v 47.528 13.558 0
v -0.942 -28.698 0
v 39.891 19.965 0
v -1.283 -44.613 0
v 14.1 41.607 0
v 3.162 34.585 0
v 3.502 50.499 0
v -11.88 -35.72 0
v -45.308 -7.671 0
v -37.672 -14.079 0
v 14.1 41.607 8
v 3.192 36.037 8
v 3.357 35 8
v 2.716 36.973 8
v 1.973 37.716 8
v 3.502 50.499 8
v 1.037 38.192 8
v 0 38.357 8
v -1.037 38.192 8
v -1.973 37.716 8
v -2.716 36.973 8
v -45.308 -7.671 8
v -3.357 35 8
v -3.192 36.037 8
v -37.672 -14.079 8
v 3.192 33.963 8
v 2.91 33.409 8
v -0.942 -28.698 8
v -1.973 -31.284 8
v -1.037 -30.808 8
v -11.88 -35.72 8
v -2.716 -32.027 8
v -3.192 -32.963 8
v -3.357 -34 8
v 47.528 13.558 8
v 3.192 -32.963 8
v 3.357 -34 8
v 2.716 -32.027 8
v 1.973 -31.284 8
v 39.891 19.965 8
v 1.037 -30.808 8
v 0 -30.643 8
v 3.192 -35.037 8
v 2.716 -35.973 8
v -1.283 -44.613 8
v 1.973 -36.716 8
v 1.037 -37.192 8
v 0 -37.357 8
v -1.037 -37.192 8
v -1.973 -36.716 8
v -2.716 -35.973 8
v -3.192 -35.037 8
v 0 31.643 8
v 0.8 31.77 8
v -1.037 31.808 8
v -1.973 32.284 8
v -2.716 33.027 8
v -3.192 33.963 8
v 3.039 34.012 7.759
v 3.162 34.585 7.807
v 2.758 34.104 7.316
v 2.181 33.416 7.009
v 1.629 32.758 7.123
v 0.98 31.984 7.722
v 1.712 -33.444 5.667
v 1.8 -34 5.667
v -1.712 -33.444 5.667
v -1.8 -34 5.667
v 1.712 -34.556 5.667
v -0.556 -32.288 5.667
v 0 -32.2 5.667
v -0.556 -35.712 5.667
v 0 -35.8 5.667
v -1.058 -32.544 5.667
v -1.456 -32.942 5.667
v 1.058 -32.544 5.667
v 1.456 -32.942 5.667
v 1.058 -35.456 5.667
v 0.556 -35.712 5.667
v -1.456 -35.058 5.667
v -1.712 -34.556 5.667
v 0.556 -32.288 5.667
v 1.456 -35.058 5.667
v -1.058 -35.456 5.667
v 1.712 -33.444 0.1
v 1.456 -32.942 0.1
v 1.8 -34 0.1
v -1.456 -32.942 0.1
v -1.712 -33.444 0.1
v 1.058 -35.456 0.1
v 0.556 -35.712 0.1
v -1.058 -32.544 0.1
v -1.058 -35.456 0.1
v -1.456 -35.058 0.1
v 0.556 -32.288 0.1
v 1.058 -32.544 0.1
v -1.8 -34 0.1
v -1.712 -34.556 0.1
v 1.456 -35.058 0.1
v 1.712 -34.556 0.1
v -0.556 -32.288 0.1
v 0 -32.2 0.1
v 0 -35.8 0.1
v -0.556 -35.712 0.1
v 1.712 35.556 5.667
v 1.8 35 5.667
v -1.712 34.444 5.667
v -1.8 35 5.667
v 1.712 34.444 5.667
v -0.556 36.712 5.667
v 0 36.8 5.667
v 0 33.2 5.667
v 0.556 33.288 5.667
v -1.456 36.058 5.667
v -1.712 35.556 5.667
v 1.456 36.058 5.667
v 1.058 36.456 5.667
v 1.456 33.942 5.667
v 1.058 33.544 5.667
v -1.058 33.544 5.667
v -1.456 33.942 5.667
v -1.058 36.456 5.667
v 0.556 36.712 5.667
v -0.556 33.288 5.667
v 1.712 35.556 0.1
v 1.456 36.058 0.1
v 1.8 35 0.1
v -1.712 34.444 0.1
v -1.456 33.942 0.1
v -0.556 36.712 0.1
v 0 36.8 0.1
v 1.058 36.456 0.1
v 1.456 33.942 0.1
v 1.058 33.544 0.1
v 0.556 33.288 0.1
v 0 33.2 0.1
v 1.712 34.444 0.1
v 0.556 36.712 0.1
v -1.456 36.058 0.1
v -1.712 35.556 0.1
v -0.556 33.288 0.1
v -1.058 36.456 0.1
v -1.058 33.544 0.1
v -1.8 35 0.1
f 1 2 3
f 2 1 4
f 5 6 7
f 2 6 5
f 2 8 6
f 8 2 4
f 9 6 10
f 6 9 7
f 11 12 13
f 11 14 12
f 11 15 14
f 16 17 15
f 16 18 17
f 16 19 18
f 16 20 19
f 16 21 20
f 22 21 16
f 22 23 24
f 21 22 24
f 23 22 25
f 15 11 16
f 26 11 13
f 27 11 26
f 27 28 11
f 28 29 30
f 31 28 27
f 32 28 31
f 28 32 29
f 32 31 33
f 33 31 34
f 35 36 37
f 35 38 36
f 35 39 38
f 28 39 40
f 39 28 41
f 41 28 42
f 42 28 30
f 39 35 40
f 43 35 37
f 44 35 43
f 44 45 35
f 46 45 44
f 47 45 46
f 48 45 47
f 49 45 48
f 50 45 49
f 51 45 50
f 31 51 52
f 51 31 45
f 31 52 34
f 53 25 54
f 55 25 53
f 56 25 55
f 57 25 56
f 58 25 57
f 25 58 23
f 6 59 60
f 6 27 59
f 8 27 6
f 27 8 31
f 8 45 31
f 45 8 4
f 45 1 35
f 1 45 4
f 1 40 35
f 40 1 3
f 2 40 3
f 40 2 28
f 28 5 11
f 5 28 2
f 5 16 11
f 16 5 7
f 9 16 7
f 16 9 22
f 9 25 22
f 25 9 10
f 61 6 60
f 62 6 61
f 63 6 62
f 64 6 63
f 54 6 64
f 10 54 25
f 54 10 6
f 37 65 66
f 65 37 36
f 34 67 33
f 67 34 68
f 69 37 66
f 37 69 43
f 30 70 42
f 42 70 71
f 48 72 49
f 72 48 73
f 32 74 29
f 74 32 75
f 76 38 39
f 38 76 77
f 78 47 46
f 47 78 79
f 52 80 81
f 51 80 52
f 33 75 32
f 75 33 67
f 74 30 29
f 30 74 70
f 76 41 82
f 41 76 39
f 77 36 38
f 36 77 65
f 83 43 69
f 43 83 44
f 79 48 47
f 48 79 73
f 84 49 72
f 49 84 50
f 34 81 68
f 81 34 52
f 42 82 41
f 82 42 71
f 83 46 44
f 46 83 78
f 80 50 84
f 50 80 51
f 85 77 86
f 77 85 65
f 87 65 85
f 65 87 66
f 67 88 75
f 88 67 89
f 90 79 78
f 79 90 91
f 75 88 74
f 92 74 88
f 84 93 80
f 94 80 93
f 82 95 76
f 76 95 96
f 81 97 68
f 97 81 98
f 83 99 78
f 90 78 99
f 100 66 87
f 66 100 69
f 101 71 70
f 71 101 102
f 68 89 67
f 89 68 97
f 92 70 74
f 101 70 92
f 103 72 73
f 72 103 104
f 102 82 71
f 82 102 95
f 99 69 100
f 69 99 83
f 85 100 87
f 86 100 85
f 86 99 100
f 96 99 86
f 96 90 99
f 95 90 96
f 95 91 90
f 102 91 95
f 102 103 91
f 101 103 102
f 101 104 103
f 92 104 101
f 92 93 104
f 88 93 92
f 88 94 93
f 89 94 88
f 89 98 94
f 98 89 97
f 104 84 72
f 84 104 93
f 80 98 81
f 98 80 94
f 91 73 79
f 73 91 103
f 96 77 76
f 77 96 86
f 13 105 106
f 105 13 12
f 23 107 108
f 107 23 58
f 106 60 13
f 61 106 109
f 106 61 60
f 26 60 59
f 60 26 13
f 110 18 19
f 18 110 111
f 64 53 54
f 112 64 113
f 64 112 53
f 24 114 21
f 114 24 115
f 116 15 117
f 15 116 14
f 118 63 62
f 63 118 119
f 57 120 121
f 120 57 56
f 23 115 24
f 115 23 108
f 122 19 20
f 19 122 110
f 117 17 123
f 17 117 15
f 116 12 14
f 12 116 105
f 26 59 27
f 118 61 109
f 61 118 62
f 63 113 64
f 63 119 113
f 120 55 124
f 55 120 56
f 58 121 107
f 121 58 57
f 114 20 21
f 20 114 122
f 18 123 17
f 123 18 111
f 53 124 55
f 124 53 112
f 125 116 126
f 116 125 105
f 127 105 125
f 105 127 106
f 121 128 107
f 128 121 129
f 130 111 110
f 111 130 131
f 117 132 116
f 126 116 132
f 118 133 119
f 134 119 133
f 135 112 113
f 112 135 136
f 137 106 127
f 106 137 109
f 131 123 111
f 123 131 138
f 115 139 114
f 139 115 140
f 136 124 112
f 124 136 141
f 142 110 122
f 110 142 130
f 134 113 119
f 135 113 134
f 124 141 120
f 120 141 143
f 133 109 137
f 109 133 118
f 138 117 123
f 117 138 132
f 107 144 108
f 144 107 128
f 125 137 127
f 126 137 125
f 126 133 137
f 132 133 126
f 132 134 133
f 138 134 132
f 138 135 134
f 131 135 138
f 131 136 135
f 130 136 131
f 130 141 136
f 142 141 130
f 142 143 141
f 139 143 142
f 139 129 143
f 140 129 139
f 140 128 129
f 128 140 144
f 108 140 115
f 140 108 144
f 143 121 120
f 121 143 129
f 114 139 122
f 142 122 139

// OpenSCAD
// Street Numbers for 3D printing
// Charles Tilford, 2019
// License: CC BY-NC-SA 4.0
//   https://creativecommons.org/licenses/by-nc-sa/4.0/

char="N";     // The number/letter to print

// Units are in mm, except for height of letter

// How many inches high should letter be?
inchesHigh=3;
// How thick/deep should letter be (mm)?
depth=8;

// Character coordinates just center the letter
charX=-40;    // Character X coord
charY=-35;    // Character Y coord
topScrew=35;  // Top screw Y coord
botScrew=-34; // Bottom screw Y coord
height=8;     // Thickness of character
// Screw dimensions. Default presumes
// #6 sheet metal screw
screwWid=3.6; // Width of screw shaft
screwTop=6.78;// Width of screw head
screwCon=5.08;// Height of head 'cone'

// Font to print in. Your system needs this
// installed, of course. If changed the hole
// positions almost certainly need to be
// changed, and maybe charX/charY.
fName="Open Sans Extrabold";
// https://fonts.google.com/specimen/Open+Sans
// Designer: Steve Matteson

// Thin floor below holes. My printer was
// struggling to have the hole 'border' stick
// to the stage. Just drill/screw thru it.
holeFloor=0.1; 

// ==========================================
// ===== All values below are auto-calculated
// ==========================================

// Scaled values
scaleFactor=inchesHigh / 3;
cX=charX * scaleFactor;
cY=charY * scaleFactor;
tS=topScrew * scaleFactor;
bS=botScrew * scaleFactor;
// Where do we start drawing screw head cone?
oS=depth - (screwCon-.05);

difference() {
  // We use difference() to punch out the screw holes
  // in the character
    
  // The character itself, 8mm thick
  rotate(a=-40)
  translate([cX,cY,0])
    linear_extrude(height=depth, scale=1)
    text(char, size=(75*scaleFactor),
         $fn=100, font=fName);
    
  // Bottom screw hole
  translate([0,bS,oS]) color("red")
    cylinder(h=screwCon, d2=screwTop,
             d1=0, $fn=20);
   translate([0,bS,holeFloor])
    cylinder(h=20, d=screwWid, $fn=20);
    
  // Top screw hole
  translate([0,tS,oS]) color("red")
    cylinder(h=screwCon, d2=screwTop,
             d1=0, $fn=20);
  translate([0,tS,holeFloor])
    cylinder(h=20, d=screwWid, $fn=20);
}

// Colors are just to aid visualization of
// void spaces. $fn is "featuer number", ie how
// many polygons are devoted to object. The values
// above should be near your printing limit anyway.

// Developed in OpenSCAD
//    https://www.openscad.org/
